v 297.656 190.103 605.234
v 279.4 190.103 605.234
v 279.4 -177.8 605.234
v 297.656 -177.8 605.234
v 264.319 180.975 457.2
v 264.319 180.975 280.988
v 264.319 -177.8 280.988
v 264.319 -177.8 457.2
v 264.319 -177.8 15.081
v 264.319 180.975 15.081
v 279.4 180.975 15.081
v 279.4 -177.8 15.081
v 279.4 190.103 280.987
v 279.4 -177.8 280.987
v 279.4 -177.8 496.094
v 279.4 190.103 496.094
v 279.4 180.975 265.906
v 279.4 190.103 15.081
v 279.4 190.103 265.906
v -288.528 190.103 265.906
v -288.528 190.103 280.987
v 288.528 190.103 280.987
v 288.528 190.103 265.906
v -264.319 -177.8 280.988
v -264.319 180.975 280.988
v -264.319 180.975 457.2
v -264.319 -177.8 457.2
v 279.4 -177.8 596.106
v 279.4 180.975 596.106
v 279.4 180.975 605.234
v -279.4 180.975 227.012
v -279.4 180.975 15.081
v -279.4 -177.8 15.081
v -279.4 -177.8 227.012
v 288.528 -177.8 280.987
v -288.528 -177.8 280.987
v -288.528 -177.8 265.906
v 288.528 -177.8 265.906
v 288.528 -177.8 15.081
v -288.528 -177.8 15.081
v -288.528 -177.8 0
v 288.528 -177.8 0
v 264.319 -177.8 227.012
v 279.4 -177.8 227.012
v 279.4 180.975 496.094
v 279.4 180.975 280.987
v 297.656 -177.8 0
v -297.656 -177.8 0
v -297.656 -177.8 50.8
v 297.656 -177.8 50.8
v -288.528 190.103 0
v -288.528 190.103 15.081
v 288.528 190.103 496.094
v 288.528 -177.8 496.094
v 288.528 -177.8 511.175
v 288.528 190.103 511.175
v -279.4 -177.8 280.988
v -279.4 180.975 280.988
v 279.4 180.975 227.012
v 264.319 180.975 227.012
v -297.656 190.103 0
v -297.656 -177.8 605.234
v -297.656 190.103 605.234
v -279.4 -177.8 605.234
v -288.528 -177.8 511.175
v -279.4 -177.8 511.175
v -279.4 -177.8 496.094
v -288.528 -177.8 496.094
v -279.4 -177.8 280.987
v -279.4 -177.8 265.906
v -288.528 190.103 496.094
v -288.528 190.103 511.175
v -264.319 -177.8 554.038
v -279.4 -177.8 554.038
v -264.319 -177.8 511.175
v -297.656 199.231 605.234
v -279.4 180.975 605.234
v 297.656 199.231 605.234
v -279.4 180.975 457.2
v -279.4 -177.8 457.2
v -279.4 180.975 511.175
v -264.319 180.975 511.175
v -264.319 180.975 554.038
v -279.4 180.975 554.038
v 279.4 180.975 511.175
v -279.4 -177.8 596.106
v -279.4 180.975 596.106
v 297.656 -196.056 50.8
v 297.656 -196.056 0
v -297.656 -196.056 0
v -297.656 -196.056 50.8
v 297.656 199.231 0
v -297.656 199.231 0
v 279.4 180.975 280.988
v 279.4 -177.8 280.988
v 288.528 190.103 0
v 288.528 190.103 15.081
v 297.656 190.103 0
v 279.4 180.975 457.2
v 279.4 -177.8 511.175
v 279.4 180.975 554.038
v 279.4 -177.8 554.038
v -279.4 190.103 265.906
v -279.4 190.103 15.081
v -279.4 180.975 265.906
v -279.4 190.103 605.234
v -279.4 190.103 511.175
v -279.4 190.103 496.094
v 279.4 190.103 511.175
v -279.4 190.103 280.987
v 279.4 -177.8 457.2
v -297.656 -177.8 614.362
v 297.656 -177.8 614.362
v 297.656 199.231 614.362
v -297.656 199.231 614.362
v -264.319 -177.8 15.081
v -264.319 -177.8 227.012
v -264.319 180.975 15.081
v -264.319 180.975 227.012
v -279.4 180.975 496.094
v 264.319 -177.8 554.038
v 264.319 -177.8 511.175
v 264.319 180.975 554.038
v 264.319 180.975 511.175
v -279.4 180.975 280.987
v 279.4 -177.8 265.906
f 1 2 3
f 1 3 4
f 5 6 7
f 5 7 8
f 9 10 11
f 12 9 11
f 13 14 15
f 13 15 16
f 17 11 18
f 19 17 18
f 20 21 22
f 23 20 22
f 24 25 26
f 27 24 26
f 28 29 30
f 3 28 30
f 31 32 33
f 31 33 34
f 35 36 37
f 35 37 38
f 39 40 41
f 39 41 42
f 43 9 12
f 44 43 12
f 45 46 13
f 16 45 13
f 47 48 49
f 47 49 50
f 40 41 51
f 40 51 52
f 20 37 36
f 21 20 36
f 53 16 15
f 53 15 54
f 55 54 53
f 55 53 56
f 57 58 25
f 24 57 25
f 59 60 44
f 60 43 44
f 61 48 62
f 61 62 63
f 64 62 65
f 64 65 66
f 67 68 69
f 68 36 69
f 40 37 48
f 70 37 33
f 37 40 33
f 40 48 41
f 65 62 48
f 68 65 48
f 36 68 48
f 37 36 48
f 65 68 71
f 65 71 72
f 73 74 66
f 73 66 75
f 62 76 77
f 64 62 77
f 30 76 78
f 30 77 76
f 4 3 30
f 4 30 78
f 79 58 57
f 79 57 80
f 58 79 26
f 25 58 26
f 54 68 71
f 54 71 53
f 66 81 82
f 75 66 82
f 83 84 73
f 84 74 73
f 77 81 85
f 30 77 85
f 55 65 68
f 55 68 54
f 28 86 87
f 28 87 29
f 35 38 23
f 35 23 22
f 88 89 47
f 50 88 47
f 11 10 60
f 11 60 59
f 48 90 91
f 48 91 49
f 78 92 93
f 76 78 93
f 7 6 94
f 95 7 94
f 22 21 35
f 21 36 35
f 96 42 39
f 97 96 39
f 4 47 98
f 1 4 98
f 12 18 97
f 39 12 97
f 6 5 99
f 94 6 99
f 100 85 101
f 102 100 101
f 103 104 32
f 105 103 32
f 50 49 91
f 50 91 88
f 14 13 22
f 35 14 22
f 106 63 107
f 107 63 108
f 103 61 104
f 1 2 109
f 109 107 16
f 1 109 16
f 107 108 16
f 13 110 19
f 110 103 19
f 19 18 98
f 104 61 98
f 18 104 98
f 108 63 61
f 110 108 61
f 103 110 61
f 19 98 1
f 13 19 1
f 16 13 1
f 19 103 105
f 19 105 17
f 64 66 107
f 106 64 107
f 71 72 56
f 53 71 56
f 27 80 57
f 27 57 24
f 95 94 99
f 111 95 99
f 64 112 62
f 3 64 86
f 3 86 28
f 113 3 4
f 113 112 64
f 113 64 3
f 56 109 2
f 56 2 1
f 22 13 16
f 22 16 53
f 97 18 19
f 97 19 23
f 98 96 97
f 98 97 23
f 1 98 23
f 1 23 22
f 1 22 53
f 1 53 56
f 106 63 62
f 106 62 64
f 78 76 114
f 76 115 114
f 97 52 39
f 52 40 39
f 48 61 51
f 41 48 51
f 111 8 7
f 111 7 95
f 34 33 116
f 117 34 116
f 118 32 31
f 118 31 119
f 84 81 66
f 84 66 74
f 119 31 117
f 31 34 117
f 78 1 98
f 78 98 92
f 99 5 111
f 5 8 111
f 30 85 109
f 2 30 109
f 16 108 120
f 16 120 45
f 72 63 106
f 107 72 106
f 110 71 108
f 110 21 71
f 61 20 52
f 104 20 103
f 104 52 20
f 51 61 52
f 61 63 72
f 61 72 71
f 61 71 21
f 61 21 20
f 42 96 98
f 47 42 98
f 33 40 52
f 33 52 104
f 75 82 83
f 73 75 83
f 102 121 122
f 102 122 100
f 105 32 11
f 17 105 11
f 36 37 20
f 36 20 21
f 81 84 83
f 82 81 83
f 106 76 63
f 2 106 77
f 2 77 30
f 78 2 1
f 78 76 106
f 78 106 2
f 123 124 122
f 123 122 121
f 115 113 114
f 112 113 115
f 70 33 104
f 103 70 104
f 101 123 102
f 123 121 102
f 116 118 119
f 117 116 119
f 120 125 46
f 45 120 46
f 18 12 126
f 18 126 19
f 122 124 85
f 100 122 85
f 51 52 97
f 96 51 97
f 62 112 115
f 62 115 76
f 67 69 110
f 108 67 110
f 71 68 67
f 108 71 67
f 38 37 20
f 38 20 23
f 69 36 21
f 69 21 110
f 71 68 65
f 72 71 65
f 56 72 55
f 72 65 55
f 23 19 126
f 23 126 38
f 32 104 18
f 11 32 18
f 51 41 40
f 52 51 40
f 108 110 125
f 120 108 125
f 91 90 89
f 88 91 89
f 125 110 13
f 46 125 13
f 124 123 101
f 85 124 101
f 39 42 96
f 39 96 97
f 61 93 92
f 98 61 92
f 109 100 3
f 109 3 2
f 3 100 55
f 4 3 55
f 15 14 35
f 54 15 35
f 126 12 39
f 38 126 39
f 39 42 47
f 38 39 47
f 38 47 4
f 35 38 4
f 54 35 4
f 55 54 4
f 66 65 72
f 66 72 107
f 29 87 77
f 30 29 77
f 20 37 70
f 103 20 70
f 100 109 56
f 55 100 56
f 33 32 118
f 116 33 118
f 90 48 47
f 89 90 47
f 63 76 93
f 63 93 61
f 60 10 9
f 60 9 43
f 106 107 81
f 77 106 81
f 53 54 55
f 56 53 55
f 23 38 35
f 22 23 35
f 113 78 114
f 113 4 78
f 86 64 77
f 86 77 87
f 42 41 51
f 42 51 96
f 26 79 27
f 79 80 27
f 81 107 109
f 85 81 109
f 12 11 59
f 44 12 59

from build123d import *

# Parameters (mm, degrees)
F1_W           = 18.25625
F1_H           = 367.903125
F6_DEPTH       = 605.234375
F0_W           = 595.3125
F0_H           = 18.25625
F7_DEPTH       = 50.8
F2_W           = 577.05625
F2_H           = 15.08125
F8_DEPTH       = 190.103125
F8_DEPTH_BACK  = 177.8
F9_DEPTH       = 177.8
F9_DEPTH_BACK  = 190.103125
F10_DEPTH      = 177.8
F10_DEPTH_BACK = 199.23125
F5_W           = 18.25625
F5_H           = 9.128125
F11_DEPTH      = 297.65625
F11_DEPTH_BACK = 297.65625
F4_W           = 15.08125
F4_H           = 211.93125
F12_DEPTH      = 177.8
F12_DEPTH_BACK = 180.975
F4_H_2         = 176.2125
F4_H_3         = 42.8625


with BuildPart() as f6:
    # F1 (on Top) → F6 (new body)
    with BuildSketch(Plane.XY):
        with Locations((-288.528125, 6.1515625)):
            Rectangle(F1_W, F1_H)
    extrude(amount=F6_DEPTH)


with BuildPart() as f6b:
    # F1 (on Top) → F6, piece 2 (new body)
    with BuildSketch(Plane.XY):
        with Locations((288.528125, 6.1515625)):
            Rectangle(F1_W, F1_H)
    extrude(amount=F6_DEPTH)


with BuildPart() as f6c:
    # F0 (on Top) → F6, piece 3 (new body)
    with BuildSketch(Plane.XY):
        Polygon((297.65625, 199.23125), (-297.65625, 199.23125), (-297.65625, 190.103125), (-279.4, 190.103125), (-279.4, 180.975), (279.4, 180.975), (279.4, 190.103125), (297.65625, 190.103125), align=None)
    extrude(amount=F6_DEPTH)


with BuildPart() as f7:
    # F0 (on Top) → F7 (new body)
    with BuildSketch(Plane.XY):
        with Locations((0, -186.928125)):
            Rectangle(F0_W, F0_H)
    extrude(amount=F7_DEPTH)


with BuildPart() as f8_tool:
    # F2 (on Front) → F8 (new body, two sides)
    with BuildSketch(Plane.XZ) as f8_sk:
        with Locations((0, 7.540625)):
            Rectangle(F2_W, F2_H)
        with Locations((0, 273.446875)):
            Rectangle(F2_W, F2_H)
        with Locations((0, 503.634375)):
            Rectangle(F2_W, F2_H)
    extrude(amount=-F8_DEPTH)
    extrude(f8_sk.sketch, amount=F8_DEPTH_BACK)


with BuildPart() as f6_1:
    add(f6.part)

    # F8: cut by f8_tool
    add(f8_tool.part, mode=Mode.SUBTRACT)


with BuildPart() as f6b_1:
    add(f6b.part)

    # F8: cut by f8_tool
    add(f8_tool.part, mode=Mode.SUBTRACT)


with BuildPart() as f6c_1:
    add(f6c.part)

    # F8: cut by f8_tool
    add(f8_tool.part, mode=Mode.SUBTRACT)


with BuildPart() as f9:
    # F2 (on Front) → F9 (new body, two sides)
    with BuildSketch(Plane.XZ) as f9_sk:
        with Locations((0, 7.540625)):
            Rectangle(F2_W, F2_H)
    extrude(amount=F9_DEPTH)
    extrude(f9_sk.sketch, amount=-F9_DEPTH_BACK)


with BuildPart() as f9b:
    # F2 (on Front) → F9, piece 2 (new body, two sides)
    with BuildSketch(Plane.XZ) as f9_2_sk:
        with Locations((0, 273.446875)):
            Rectangle(F2_W, F2_H)
    extrude(amount=F9_DEPTH)
    extrude(f9_2_sk.sketch, amount=-F9_DEPTH_BACK)


with BuildPart() as f9c:
    # F2 (on Front) → F9, piece 3 (new body, two sides)
    with BuildSketch(Plane.XZ) as f9_3_sk:
        with Locations((0, 503.634375)):
            Rectangle(F2_W, F2_H)
    extrude(amount=F9_DEPTH)
    extrude(f9_3_sk.sketch, amount=-F9_DEPTH_BACK)


with BuildPart() as f10:
    # F3 (on Front) → F10 (new body, two sides)
    with BuildSketch(Plane.XZ) as f10_sk:
        Polygon((297.65625, 614.3625), (-297.65625, 614.3625), (-297.65625, 605.234375), (-279.4, 605.234375), (-279.4, 596.10625), (279.4, 596.10625), (279.4, 605.234375), (297.65625, 605.234375), align=None)
    extrude(amount=F10_DEPTH)
    extrude(f10_sk.sketch, amount=-F10_DEPTH_BACK)

    # F5 (on Right) → F11 (cut, two sides)
    with BuildSketch(Plane.YZ) as f11_sk:
        with Locations((190.103125, 600.6703125)):
            Rectangle(F5_W, F5_H)
    extrude(amount=-F11_DEPTH, mode=Mode.SUBTRACT)
    extrude(f11_sk.sketch, amount=F11_DEPTH_BACK, mode=Mode.SUBTRACT)


with BuildPart() as f12:
    # F4 (on Front) → F12 (new body, two sides)
    with BuildSketch(Plane.XZ) as f12_sk:
        with Locations((-271.859375, 121.046875)):
            Rectangle(F4_W, F4_H)
    extrude(amount=F12_DEPTH)
    extrude(f12_sk.sketch, amount=-F12_DEPTH_BACK)


with BuildPart() as f12b:
    # F4 (on Front) → F12, piece 2 (new body, two sides)
    with BuildSketch(Plane.XZ) as f12_2_sk:
        with Locations((-271.859375, 369.09375)):
            Rectangle(F4_W, F4_H_2)
    extrude(amount=F12_DEPTH)
    extrude(f12_2_sk.sketch, amount=-F12_DEPTH_BACK)


with BuildPart() as f12c:
    # F4 (on Front) → F12, piece 3 (new body, two sides)
    with BuildSketch(Plane.XZ) as f12_3_sk:
        with Locations((-271.859375, 532.60625)):
            Rectangle(F4_W, F4_H_3)
    extrude(amount=F12_DEPTH)
    extrude(f12_3_sk.sketch, amount=-F12_DEPTH_BACK)


with BuildPart() as f12d:
    # F4 (on Front) → F12, piece 4 (new body, two sides)
    with BuildSketch(Plane.XZ) as f12_4_sk:
        with Locations((271.859375, 369.09375)):
            Rectangle(F4_W, F4_H_2)
    extrude(amount=F12_DEPTH)
    extrude(f12_4_sk.sketch, amount=-F12_DEPTH_BACK)


with BuildPart() as f12e:
    # F4 (on Front) → F12, piece 5 (new body, two sides)
    with BuildSketch(Plane.XZ) as f12_5_sk:
        with Locations((271.859375, 121.046875)):
            Rectangle(F4_W, F4_H)
    extrude(amount=F12_DEPTH)
    extrude(f12_5_sk.sketch, amount=-F12_DEPTH_BACK)


with BuildPart() as f12f:
    # F4 (on Front) → F12, piece 6 (new body, two sides)
    with BuildSketch(Plane.XZ) as f12_6_sk:
        with Locations((271.859375, 532.60625)):
            Rectangle(F4_W, F4_H_3)
    extrude(amount=F12_DEPTH)
    extrude(f12_6_sk.sketch, amount=-F12_DEPTH_BACK)


solid = Compound([f7.part, f6_1.part, f6b_1.part, f6c_1.part, f9.part, f9b.part, f9c.part, f10.part, f12.part, f12b.part, f12c.part, f12d.part, f12e.part, f12f.part])
